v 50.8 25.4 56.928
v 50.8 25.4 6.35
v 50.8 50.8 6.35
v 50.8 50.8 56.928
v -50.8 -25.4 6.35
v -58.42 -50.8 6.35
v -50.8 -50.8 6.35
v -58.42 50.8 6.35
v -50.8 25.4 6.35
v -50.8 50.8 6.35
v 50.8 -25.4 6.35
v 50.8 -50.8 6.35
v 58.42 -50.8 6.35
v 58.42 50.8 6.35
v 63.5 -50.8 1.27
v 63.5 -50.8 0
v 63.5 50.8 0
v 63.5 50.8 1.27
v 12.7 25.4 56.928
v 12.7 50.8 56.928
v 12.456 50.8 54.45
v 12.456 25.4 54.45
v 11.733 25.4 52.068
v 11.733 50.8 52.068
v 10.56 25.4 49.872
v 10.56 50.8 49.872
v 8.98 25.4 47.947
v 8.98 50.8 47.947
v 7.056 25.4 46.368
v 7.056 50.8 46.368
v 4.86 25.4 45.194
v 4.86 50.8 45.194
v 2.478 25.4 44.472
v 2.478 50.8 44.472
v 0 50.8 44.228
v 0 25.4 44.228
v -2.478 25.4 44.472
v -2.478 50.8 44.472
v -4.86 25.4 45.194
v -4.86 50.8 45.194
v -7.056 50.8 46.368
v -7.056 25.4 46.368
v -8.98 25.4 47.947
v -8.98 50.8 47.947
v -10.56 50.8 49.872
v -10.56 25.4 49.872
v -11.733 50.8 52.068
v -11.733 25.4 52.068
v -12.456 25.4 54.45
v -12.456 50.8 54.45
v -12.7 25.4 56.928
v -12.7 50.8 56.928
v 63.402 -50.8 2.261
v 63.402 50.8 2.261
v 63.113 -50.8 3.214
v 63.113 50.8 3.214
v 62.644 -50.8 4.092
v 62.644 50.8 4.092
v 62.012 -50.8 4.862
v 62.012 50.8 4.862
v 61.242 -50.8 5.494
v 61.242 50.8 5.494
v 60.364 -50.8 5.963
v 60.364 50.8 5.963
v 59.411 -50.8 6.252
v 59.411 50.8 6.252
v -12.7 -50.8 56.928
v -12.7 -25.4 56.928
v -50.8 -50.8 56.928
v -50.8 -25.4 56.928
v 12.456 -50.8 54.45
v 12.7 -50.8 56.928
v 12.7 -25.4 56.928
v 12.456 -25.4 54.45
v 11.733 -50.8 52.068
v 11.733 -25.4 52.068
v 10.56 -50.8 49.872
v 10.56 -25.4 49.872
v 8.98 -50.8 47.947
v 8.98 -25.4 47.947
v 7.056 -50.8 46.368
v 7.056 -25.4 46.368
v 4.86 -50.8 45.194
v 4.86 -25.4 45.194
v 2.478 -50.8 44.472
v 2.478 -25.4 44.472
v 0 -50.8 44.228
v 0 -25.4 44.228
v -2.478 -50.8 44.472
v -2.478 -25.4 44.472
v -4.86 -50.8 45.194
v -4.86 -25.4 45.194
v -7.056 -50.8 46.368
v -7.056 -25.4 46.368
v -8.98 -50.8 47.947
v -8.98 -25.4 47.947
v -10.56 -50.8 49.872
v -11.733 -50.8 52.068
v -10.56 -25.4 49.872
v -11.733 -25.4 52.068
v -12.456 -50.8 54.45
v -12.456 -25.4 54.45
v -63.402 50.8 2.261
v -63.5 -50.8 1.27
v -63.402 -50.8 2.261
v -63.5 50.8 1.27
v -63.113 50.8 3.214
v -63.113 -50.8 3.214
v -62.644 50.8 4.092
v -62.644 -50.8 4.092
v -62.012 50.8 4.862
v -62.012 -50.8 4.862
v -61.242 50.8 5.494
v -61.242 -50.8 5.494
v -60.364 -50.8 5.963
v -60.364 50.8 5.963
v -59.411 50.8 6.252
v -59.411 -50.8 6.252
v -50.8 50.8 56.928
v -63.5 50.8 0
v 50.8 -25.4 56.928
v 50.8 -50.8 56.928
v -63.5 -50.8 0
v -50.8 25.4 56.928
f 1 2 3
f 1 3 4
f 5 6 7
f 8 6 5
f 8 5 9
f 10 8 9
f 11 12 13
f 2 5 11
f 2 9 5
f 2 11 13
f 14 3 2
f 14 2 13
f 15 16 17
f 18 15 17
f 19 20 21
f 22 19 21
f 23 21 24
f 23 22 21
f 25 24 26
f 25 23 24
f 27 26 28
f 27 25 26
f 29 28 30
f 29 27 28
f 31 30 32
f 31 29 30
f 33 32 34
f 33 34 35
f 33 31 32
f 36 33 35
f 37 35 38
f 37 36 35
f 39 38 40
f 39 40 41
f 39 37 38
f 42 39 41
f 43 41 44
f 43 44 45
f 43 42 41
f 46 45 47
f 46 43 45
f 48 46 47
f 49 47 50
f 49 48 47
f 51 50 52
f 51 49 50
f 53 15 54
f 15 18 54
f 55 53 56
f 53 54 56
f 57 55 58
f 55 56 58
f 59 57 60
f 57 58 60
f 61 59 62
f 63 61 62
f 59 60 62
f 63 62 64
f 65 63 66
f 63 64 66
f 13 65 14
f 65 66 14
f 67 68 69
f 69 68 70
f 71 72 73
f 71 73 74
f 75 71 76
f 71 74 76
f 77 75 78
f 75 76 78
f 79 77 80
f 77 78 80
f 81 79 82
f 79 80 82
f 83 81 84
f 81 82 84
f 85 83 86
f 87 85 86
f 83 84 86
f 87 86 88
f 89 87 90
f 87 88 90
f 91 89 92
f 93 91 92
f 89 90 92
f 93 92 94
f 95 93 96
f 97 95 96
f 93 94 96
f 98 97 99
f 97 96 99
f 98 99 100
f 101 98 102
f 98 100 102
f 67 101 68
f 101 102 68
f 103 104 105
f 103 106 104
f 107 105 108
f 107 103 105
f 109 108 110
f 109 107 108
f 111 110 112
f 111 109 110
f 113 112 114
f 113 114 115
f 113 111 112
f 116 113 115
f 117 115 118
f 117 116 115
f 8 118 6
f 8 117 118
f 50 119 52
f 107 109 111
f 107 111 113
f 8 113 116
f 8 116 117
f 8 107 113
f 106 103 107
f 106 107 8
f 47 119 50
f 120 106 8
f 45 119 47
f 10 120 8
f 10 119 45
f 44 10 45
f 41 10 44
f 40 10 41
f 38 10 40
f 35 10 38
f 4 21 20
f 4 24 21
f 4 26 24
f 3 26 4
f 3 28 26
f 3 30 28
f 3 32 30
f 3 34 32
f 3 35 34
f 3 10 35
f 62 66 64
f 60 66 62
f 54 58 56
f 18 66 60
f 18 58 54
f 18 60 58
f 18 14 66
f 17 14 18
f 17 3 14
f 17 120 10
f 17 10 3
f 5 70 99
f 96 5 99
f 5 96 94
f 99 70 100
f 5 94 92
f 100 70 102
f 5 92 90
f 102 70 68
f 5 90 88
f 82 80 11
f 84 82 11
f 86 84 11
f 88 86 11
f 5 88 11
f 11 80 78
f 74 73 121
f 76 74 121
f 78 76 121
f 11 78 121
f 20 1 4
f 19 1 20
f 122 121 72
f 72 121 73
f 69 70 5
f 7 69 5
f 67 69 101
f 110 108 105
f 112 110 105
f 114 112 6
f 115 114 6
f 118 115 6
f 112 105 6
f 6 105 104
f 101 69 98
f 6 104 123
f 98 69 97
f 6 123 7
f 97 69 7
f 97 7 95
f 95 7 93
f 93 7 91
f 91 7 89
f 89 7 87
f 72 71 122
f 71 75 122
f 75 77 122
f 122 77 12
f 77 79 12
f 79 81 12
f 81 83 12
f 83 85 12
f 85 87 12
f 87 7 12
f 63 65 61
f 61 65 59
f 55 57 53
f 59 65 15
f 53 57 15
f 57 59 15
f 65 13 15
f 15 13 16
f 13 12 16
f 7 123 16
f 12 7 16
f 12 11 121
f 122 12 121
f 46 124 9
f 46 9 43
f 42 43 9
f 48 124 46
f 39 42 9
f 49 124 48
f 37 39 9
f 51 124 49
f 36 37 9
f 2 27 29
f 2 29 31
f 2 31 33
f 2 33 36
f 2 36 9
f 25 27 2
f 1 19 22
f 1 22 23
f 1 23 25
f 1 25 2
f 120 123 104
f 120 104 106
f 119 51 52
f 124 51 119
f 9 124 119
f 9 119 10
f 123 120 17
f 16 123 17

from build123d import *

# Parameters (mm, degrees)
F0_W     = 127
F0_H     = 101.6
F1_DEPTH = 6.35
F4_R     = 5.08
F5_DEPTH = 25.4


with BuildPart() as f1:
    # F0 (on Top) → F1 (new body)
    with BuildSketch(Plane.XY):
        Rectangle(F0_W, F0_H)
    extrude(amount=F1_DEPTH)

    # F4
    f4_edges = [f1.edges().sort_by_distance(p)[0] for p in [
        (63.5, 0, 6.35),
        (-63.5, 0, 6.35),
    ]]
    fillet(f4_edges, radius=F4_R)

    # F3 (on offset) → F5 (join)
    with BuildSketch(Plane.XZ.offset(25.4)):
        with BuildLine():
            Line((-50.8, 6.127627), (50.8, 6.127627))
            Line((50.8, 6.127627), (50.8, 56.927627))
            Line((50.8, 56.927627), (12.7, 56.927627))
            ThreePointArc((12.7, 56.927627), (0, 44.227627), (-12.7, 56.927627))
            Line((-12.7, 56.927627), (-50.8, 56.927627))
            Line((-50.8, 56.927627), (-50.8, 6.127627))
        make_face()
    extrude(amount=F5_DEPTH)

    # F6: F1 across plane


with BuildPart() as f1_1:
    add(f1.part)
    add(f1.part.mirror(Plane.XZ))


solid = f1_1.part
